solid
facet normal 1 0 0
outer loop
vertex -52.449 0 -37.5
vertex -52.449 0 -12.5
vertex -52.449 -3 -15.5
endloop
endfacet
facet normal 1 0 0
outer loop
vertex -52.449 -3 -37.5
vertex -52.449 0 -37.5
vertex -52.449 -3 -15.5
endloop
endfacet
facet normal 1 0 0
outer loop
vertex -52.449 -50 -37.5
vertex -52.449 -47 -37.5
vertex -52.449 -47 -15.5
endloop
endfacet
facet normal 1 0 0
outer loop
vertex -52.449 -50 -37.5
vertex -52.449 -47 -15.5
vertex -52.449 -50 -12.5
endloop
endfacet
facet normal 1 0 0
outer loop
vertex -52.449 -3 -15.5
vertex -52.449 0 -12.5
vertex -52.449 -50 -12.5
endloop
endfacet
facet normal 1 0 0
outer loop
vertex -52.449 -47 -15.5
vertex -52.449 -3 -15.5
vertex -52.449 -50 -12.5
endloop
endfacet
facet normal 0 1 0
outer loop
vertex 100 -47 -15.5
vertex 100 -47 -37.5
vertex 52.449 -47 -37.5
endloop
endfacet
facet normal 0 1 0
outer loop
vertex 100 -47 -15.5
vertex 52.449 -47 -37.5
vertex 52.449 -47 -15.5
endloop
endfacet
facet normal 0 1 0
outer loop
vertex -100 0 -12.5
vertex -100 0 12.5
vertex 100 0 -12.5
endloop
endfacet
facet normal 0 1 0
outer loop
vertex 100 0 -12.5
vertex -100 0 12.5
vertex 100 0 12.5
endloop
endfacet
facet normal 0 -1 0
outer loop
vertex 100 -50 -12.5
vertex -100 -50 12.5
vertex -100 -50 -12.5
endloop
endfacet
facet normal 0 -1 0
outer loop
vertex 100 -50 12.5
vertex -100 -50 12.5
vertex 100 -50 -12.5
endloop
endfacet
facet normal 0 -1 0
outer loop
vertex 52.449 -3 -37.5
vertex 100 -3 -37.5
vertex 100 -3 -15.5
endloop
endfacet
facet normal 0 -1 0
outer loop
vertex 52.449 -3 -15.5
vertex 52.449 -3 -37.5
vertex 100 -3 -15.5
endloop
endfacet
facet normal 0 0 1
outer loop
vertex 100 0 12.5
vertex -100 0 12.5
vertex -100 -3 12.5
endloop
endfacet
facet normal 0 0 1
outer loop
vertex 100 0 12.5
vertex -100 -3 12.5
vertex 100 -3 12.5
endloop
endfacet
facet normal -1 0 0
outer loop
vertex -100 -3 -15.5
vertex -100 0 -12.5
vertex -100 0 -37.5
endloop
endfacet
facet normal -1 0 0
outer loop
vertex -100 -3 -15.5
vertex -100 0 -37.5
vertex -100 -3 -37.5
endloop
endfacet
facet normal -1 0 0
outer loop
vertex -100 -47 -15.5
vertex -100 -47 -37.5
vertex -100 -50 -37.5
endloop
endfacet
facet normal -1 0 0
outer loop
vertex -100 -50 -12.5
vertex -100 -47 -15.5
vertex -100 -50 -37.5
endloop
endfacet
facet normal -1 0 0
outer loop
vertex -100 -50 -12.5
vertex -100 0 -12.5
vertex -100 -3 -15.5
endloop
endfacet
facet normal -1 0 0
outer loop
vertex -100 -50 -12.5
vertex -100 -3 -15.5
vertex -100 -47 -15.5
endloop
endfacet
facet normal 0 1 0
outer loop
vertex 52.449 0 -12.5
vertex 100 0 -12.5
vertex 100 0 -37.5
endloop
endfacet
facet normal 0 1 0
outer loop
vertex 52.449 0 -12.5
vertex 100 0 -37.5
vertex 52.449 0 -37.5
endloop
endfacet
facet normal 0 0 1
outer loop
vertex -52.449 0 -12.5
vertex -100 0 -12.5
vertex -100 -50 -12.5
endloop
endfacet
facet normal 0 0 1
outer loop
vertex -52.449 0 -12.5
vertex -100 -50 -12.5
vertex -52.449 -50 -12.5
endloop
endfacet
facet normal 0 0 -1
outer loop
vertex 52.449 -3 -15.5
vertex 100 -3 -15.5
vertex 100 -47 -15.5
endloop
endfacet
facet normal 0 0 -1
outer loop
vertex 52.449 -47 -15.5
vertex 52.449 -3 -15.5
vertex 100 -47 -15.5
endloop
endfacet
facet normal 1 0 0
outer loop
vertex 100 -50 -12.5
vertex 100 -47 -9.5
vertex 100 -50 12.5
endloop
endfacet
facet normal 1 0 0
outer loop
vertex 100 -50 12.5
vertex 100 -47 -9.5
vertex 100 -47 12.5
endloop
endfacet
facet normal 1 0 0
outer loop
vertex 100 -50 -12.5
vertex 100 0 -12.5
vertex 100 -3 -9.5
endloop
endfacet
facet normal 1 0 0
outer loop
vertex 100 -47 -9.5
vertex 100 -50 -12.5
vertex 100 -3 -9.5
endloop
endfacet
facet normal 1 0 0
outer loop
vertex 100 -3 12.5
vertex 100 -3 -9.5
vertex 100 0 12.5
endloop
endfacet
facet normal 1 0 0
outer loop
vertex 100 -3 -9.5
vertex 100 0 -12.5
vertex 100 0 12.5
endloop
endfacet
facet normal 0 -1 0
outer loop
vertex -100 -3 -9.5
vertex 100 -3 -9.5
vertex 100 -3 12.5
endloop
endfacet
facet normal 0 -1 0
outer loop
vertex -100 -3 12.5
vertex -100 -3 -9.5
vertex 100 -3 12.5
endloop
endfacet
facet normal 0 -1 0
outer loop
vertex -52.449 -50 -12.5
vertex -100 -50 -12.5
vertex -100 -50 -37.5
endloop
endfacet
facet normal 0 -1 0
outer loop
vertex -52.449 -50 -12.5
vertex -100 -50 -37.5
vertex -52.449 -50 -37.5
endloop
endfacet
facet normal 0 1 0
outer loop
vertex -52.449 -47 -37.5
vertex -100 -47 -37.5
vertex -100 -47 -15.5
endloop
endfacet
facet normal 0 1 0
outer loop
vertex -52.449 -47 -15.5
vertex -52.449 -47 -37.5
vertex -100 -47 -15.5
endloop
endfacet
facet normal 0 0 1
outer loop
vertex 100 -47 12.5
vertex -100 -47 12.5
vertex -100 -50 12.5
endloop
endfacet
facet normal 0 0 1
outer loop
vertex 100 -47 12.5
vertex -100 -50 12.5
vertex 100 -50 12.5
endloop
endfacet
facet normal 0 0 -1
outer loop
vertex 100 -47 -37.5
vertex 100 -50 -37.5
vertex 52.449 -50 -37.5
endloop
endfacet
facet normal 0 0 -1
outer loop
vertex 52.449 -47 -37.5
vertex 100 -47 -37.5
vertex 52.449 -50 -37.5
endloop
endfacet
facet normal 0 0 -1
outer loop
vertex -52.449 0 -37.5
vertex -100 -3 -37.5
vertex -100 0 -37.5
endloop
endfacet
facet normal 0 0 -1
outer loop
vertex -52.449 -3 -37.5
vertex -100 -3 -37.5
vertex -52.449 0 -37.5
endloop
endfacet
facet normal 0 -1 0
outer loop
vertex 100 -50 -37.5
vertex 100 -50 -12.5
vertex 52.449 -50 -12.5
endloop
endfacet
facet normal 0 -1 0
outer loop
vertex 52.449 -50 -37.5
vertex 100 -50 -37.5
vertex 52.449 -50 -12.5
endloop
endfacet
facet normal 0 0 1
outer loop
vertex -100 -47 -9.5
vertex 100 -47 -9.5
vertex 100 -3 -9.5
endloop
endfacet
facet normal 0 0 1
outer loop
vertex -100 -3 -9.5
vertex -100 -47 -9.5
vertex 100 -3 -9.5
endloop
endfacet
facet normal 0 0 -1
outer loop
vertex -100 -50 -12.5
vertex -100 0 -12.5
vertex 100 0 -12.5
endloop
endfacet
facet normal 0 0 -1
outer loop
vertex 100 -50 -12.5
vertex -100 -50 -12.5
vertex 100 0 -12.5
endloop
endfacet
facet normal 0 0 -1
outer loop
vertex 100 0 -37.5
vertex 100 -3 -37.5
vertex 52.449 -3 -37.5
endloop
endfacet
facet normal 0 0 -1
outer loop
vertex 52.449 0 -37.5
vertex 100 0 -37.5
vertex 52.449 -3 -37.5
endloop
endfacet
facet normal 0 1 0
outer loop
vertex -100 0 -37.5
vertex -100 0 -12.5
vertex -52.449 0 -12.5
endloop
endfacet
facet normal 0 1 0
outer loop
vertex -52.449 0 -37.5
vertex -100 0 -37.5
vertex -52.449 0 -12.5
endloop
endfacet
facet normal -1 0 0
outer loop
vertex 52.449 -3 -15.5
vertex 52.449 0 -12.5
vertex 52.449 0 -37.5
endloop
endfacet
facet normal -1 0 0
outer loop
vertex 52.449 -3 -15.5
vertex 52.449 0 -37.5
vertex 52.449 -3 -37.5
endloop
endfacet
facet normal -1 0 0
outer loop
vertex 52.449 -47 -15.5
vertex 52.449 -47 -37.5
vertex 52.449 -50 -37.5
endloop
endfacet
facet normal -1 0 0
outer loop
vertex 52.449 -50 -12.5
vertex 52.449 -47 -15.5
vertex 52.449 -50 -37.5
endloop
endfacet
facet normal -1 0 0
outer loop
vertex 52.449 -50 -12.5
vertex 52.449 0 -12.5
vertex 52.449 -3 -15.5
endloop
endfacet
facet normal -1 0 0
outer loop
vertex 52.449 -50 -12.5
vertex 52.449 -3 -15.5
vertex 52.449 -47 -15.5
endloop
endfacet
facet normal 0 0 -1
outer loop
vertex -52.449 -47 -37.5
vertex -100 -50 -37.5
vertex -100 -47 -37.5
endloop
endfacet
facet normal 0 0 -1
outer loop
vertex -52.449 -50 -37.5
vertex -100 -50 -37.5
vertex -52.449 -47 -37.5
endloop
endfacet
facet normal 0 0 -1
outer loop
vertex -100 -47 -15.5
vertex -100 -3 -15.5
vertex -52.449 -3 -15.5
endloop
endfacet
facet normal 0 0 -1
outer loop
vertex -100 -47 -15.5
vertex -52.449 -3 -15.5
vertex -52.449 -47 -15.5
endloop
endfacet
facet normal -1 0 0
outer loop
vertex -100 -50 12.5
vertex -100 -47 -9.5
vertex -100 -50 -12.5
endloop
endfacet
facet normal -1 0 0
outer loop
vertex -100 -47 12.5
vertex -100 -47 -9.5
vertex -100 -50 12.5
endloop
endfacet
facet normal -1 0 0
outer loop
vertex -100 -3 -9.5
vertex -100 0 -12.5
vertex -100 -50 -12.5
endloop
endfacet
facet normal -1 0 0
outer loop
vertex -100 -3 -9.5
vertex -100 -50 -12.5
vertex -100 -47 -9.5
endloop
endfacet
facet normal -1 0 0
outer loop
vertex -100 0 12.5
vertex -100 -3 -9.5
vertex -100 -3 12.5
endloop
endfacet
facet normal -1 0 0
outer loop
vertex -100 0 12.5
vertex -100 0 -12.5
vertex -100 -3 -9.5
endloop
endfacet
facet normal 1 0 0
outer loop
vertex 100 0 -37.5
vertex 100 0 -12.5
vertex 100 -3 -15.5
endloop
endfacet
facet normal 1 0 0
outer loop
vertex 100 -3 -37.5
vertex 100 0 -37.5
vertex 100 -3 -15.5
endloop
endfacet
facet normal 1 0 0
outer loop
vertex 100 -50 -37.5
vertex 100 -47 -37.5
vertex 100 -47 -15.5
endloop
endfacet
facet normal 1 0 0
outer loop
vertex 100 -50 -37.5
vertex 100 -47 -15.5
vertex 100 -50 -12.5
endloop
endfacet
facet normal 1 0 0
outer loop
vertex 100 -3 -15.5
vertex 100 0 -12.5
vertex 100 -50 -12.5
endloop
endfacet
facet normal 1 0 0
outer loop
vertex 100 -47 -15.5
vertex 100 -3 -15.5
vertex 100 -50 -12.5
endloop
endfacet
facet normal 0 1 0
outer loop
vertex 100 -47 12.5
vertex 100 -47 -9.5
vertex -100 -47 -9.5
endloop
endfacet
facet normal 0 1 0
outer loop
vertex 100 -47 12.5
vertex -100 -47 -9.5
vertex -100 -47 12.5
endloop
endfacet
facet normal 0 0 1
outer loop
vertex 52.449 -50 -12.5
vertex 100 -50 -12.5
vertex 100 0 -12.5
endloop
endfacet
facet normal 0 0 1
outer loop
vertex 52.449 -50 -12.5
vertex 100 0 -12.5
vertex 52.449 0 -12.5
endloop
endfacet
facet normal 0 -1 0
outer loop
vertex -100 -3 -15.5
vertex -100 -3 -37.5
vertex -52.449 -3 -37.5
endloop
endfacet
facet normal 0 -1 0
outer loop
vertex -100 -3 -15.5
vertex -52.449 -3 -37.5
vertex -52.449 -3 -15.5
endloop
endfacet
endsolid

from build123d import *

# Parameters (mm, degrees)
F0_W     = 200
F0_H     = 25
F1_DEPTH = 50
F2_W     = 44
F2_H     = 22
F3_DEPTH = 200.001
F4_W     = 47.55112
F4_H     = 50
F5_DEPTH = 25
F6_W     = 44
F6_H     = 22
F7_DEPTH = 200.001


with BuildPart() as f1:
    # F0 (on Front) → F1 (new body)
    with BuildSketch(Plane.XZ):
        Rectangle(F0_W, F0_H)
    extrude(amount=F1_DEPTH)

    # F2 (on face) → F3 (cut, through all)
    with BuildSketch(Plane.YZ.offset(100)):
        with Locations((-25, 1.5)):
            Rectangle(F2_W, F2_H)
    extrude(amount=-F3_DEPTH, mode=Mode.SUBTRACT)


with BuildPart() as f5:
    # F4 (on face) → F5 (new body)
    with BuildSketch(Plane(origin=(0, 0, -12.5), x_dir=(1, 0, 0), z_dir=(0, 0, -1))):
        with Locations((-76.22444, 25)):
            Rectangle(F4_W, F4_H)
    extrude(amount=F5_DEPTH)

    # F6 (on face) → F7 (cut, through all)
    with BuildSketch(Plane(origin=(-100, 0, 0), x_dir=(0, -1, 0), z_dir=(-1, 0, 0))):
        with Locations((25, -26.5)):
            Rectangle(F6_W, F6_H)
    extrude(amount=-F7_DEPTH, mode=Mode.SUBTRACT)


with BuildPart() as f8_1:
    # F8: instance of F5
    add(f5.part.mirror(Plane.YZ))


solid = Compound([f1.part, f5.part, f8_1.part])
